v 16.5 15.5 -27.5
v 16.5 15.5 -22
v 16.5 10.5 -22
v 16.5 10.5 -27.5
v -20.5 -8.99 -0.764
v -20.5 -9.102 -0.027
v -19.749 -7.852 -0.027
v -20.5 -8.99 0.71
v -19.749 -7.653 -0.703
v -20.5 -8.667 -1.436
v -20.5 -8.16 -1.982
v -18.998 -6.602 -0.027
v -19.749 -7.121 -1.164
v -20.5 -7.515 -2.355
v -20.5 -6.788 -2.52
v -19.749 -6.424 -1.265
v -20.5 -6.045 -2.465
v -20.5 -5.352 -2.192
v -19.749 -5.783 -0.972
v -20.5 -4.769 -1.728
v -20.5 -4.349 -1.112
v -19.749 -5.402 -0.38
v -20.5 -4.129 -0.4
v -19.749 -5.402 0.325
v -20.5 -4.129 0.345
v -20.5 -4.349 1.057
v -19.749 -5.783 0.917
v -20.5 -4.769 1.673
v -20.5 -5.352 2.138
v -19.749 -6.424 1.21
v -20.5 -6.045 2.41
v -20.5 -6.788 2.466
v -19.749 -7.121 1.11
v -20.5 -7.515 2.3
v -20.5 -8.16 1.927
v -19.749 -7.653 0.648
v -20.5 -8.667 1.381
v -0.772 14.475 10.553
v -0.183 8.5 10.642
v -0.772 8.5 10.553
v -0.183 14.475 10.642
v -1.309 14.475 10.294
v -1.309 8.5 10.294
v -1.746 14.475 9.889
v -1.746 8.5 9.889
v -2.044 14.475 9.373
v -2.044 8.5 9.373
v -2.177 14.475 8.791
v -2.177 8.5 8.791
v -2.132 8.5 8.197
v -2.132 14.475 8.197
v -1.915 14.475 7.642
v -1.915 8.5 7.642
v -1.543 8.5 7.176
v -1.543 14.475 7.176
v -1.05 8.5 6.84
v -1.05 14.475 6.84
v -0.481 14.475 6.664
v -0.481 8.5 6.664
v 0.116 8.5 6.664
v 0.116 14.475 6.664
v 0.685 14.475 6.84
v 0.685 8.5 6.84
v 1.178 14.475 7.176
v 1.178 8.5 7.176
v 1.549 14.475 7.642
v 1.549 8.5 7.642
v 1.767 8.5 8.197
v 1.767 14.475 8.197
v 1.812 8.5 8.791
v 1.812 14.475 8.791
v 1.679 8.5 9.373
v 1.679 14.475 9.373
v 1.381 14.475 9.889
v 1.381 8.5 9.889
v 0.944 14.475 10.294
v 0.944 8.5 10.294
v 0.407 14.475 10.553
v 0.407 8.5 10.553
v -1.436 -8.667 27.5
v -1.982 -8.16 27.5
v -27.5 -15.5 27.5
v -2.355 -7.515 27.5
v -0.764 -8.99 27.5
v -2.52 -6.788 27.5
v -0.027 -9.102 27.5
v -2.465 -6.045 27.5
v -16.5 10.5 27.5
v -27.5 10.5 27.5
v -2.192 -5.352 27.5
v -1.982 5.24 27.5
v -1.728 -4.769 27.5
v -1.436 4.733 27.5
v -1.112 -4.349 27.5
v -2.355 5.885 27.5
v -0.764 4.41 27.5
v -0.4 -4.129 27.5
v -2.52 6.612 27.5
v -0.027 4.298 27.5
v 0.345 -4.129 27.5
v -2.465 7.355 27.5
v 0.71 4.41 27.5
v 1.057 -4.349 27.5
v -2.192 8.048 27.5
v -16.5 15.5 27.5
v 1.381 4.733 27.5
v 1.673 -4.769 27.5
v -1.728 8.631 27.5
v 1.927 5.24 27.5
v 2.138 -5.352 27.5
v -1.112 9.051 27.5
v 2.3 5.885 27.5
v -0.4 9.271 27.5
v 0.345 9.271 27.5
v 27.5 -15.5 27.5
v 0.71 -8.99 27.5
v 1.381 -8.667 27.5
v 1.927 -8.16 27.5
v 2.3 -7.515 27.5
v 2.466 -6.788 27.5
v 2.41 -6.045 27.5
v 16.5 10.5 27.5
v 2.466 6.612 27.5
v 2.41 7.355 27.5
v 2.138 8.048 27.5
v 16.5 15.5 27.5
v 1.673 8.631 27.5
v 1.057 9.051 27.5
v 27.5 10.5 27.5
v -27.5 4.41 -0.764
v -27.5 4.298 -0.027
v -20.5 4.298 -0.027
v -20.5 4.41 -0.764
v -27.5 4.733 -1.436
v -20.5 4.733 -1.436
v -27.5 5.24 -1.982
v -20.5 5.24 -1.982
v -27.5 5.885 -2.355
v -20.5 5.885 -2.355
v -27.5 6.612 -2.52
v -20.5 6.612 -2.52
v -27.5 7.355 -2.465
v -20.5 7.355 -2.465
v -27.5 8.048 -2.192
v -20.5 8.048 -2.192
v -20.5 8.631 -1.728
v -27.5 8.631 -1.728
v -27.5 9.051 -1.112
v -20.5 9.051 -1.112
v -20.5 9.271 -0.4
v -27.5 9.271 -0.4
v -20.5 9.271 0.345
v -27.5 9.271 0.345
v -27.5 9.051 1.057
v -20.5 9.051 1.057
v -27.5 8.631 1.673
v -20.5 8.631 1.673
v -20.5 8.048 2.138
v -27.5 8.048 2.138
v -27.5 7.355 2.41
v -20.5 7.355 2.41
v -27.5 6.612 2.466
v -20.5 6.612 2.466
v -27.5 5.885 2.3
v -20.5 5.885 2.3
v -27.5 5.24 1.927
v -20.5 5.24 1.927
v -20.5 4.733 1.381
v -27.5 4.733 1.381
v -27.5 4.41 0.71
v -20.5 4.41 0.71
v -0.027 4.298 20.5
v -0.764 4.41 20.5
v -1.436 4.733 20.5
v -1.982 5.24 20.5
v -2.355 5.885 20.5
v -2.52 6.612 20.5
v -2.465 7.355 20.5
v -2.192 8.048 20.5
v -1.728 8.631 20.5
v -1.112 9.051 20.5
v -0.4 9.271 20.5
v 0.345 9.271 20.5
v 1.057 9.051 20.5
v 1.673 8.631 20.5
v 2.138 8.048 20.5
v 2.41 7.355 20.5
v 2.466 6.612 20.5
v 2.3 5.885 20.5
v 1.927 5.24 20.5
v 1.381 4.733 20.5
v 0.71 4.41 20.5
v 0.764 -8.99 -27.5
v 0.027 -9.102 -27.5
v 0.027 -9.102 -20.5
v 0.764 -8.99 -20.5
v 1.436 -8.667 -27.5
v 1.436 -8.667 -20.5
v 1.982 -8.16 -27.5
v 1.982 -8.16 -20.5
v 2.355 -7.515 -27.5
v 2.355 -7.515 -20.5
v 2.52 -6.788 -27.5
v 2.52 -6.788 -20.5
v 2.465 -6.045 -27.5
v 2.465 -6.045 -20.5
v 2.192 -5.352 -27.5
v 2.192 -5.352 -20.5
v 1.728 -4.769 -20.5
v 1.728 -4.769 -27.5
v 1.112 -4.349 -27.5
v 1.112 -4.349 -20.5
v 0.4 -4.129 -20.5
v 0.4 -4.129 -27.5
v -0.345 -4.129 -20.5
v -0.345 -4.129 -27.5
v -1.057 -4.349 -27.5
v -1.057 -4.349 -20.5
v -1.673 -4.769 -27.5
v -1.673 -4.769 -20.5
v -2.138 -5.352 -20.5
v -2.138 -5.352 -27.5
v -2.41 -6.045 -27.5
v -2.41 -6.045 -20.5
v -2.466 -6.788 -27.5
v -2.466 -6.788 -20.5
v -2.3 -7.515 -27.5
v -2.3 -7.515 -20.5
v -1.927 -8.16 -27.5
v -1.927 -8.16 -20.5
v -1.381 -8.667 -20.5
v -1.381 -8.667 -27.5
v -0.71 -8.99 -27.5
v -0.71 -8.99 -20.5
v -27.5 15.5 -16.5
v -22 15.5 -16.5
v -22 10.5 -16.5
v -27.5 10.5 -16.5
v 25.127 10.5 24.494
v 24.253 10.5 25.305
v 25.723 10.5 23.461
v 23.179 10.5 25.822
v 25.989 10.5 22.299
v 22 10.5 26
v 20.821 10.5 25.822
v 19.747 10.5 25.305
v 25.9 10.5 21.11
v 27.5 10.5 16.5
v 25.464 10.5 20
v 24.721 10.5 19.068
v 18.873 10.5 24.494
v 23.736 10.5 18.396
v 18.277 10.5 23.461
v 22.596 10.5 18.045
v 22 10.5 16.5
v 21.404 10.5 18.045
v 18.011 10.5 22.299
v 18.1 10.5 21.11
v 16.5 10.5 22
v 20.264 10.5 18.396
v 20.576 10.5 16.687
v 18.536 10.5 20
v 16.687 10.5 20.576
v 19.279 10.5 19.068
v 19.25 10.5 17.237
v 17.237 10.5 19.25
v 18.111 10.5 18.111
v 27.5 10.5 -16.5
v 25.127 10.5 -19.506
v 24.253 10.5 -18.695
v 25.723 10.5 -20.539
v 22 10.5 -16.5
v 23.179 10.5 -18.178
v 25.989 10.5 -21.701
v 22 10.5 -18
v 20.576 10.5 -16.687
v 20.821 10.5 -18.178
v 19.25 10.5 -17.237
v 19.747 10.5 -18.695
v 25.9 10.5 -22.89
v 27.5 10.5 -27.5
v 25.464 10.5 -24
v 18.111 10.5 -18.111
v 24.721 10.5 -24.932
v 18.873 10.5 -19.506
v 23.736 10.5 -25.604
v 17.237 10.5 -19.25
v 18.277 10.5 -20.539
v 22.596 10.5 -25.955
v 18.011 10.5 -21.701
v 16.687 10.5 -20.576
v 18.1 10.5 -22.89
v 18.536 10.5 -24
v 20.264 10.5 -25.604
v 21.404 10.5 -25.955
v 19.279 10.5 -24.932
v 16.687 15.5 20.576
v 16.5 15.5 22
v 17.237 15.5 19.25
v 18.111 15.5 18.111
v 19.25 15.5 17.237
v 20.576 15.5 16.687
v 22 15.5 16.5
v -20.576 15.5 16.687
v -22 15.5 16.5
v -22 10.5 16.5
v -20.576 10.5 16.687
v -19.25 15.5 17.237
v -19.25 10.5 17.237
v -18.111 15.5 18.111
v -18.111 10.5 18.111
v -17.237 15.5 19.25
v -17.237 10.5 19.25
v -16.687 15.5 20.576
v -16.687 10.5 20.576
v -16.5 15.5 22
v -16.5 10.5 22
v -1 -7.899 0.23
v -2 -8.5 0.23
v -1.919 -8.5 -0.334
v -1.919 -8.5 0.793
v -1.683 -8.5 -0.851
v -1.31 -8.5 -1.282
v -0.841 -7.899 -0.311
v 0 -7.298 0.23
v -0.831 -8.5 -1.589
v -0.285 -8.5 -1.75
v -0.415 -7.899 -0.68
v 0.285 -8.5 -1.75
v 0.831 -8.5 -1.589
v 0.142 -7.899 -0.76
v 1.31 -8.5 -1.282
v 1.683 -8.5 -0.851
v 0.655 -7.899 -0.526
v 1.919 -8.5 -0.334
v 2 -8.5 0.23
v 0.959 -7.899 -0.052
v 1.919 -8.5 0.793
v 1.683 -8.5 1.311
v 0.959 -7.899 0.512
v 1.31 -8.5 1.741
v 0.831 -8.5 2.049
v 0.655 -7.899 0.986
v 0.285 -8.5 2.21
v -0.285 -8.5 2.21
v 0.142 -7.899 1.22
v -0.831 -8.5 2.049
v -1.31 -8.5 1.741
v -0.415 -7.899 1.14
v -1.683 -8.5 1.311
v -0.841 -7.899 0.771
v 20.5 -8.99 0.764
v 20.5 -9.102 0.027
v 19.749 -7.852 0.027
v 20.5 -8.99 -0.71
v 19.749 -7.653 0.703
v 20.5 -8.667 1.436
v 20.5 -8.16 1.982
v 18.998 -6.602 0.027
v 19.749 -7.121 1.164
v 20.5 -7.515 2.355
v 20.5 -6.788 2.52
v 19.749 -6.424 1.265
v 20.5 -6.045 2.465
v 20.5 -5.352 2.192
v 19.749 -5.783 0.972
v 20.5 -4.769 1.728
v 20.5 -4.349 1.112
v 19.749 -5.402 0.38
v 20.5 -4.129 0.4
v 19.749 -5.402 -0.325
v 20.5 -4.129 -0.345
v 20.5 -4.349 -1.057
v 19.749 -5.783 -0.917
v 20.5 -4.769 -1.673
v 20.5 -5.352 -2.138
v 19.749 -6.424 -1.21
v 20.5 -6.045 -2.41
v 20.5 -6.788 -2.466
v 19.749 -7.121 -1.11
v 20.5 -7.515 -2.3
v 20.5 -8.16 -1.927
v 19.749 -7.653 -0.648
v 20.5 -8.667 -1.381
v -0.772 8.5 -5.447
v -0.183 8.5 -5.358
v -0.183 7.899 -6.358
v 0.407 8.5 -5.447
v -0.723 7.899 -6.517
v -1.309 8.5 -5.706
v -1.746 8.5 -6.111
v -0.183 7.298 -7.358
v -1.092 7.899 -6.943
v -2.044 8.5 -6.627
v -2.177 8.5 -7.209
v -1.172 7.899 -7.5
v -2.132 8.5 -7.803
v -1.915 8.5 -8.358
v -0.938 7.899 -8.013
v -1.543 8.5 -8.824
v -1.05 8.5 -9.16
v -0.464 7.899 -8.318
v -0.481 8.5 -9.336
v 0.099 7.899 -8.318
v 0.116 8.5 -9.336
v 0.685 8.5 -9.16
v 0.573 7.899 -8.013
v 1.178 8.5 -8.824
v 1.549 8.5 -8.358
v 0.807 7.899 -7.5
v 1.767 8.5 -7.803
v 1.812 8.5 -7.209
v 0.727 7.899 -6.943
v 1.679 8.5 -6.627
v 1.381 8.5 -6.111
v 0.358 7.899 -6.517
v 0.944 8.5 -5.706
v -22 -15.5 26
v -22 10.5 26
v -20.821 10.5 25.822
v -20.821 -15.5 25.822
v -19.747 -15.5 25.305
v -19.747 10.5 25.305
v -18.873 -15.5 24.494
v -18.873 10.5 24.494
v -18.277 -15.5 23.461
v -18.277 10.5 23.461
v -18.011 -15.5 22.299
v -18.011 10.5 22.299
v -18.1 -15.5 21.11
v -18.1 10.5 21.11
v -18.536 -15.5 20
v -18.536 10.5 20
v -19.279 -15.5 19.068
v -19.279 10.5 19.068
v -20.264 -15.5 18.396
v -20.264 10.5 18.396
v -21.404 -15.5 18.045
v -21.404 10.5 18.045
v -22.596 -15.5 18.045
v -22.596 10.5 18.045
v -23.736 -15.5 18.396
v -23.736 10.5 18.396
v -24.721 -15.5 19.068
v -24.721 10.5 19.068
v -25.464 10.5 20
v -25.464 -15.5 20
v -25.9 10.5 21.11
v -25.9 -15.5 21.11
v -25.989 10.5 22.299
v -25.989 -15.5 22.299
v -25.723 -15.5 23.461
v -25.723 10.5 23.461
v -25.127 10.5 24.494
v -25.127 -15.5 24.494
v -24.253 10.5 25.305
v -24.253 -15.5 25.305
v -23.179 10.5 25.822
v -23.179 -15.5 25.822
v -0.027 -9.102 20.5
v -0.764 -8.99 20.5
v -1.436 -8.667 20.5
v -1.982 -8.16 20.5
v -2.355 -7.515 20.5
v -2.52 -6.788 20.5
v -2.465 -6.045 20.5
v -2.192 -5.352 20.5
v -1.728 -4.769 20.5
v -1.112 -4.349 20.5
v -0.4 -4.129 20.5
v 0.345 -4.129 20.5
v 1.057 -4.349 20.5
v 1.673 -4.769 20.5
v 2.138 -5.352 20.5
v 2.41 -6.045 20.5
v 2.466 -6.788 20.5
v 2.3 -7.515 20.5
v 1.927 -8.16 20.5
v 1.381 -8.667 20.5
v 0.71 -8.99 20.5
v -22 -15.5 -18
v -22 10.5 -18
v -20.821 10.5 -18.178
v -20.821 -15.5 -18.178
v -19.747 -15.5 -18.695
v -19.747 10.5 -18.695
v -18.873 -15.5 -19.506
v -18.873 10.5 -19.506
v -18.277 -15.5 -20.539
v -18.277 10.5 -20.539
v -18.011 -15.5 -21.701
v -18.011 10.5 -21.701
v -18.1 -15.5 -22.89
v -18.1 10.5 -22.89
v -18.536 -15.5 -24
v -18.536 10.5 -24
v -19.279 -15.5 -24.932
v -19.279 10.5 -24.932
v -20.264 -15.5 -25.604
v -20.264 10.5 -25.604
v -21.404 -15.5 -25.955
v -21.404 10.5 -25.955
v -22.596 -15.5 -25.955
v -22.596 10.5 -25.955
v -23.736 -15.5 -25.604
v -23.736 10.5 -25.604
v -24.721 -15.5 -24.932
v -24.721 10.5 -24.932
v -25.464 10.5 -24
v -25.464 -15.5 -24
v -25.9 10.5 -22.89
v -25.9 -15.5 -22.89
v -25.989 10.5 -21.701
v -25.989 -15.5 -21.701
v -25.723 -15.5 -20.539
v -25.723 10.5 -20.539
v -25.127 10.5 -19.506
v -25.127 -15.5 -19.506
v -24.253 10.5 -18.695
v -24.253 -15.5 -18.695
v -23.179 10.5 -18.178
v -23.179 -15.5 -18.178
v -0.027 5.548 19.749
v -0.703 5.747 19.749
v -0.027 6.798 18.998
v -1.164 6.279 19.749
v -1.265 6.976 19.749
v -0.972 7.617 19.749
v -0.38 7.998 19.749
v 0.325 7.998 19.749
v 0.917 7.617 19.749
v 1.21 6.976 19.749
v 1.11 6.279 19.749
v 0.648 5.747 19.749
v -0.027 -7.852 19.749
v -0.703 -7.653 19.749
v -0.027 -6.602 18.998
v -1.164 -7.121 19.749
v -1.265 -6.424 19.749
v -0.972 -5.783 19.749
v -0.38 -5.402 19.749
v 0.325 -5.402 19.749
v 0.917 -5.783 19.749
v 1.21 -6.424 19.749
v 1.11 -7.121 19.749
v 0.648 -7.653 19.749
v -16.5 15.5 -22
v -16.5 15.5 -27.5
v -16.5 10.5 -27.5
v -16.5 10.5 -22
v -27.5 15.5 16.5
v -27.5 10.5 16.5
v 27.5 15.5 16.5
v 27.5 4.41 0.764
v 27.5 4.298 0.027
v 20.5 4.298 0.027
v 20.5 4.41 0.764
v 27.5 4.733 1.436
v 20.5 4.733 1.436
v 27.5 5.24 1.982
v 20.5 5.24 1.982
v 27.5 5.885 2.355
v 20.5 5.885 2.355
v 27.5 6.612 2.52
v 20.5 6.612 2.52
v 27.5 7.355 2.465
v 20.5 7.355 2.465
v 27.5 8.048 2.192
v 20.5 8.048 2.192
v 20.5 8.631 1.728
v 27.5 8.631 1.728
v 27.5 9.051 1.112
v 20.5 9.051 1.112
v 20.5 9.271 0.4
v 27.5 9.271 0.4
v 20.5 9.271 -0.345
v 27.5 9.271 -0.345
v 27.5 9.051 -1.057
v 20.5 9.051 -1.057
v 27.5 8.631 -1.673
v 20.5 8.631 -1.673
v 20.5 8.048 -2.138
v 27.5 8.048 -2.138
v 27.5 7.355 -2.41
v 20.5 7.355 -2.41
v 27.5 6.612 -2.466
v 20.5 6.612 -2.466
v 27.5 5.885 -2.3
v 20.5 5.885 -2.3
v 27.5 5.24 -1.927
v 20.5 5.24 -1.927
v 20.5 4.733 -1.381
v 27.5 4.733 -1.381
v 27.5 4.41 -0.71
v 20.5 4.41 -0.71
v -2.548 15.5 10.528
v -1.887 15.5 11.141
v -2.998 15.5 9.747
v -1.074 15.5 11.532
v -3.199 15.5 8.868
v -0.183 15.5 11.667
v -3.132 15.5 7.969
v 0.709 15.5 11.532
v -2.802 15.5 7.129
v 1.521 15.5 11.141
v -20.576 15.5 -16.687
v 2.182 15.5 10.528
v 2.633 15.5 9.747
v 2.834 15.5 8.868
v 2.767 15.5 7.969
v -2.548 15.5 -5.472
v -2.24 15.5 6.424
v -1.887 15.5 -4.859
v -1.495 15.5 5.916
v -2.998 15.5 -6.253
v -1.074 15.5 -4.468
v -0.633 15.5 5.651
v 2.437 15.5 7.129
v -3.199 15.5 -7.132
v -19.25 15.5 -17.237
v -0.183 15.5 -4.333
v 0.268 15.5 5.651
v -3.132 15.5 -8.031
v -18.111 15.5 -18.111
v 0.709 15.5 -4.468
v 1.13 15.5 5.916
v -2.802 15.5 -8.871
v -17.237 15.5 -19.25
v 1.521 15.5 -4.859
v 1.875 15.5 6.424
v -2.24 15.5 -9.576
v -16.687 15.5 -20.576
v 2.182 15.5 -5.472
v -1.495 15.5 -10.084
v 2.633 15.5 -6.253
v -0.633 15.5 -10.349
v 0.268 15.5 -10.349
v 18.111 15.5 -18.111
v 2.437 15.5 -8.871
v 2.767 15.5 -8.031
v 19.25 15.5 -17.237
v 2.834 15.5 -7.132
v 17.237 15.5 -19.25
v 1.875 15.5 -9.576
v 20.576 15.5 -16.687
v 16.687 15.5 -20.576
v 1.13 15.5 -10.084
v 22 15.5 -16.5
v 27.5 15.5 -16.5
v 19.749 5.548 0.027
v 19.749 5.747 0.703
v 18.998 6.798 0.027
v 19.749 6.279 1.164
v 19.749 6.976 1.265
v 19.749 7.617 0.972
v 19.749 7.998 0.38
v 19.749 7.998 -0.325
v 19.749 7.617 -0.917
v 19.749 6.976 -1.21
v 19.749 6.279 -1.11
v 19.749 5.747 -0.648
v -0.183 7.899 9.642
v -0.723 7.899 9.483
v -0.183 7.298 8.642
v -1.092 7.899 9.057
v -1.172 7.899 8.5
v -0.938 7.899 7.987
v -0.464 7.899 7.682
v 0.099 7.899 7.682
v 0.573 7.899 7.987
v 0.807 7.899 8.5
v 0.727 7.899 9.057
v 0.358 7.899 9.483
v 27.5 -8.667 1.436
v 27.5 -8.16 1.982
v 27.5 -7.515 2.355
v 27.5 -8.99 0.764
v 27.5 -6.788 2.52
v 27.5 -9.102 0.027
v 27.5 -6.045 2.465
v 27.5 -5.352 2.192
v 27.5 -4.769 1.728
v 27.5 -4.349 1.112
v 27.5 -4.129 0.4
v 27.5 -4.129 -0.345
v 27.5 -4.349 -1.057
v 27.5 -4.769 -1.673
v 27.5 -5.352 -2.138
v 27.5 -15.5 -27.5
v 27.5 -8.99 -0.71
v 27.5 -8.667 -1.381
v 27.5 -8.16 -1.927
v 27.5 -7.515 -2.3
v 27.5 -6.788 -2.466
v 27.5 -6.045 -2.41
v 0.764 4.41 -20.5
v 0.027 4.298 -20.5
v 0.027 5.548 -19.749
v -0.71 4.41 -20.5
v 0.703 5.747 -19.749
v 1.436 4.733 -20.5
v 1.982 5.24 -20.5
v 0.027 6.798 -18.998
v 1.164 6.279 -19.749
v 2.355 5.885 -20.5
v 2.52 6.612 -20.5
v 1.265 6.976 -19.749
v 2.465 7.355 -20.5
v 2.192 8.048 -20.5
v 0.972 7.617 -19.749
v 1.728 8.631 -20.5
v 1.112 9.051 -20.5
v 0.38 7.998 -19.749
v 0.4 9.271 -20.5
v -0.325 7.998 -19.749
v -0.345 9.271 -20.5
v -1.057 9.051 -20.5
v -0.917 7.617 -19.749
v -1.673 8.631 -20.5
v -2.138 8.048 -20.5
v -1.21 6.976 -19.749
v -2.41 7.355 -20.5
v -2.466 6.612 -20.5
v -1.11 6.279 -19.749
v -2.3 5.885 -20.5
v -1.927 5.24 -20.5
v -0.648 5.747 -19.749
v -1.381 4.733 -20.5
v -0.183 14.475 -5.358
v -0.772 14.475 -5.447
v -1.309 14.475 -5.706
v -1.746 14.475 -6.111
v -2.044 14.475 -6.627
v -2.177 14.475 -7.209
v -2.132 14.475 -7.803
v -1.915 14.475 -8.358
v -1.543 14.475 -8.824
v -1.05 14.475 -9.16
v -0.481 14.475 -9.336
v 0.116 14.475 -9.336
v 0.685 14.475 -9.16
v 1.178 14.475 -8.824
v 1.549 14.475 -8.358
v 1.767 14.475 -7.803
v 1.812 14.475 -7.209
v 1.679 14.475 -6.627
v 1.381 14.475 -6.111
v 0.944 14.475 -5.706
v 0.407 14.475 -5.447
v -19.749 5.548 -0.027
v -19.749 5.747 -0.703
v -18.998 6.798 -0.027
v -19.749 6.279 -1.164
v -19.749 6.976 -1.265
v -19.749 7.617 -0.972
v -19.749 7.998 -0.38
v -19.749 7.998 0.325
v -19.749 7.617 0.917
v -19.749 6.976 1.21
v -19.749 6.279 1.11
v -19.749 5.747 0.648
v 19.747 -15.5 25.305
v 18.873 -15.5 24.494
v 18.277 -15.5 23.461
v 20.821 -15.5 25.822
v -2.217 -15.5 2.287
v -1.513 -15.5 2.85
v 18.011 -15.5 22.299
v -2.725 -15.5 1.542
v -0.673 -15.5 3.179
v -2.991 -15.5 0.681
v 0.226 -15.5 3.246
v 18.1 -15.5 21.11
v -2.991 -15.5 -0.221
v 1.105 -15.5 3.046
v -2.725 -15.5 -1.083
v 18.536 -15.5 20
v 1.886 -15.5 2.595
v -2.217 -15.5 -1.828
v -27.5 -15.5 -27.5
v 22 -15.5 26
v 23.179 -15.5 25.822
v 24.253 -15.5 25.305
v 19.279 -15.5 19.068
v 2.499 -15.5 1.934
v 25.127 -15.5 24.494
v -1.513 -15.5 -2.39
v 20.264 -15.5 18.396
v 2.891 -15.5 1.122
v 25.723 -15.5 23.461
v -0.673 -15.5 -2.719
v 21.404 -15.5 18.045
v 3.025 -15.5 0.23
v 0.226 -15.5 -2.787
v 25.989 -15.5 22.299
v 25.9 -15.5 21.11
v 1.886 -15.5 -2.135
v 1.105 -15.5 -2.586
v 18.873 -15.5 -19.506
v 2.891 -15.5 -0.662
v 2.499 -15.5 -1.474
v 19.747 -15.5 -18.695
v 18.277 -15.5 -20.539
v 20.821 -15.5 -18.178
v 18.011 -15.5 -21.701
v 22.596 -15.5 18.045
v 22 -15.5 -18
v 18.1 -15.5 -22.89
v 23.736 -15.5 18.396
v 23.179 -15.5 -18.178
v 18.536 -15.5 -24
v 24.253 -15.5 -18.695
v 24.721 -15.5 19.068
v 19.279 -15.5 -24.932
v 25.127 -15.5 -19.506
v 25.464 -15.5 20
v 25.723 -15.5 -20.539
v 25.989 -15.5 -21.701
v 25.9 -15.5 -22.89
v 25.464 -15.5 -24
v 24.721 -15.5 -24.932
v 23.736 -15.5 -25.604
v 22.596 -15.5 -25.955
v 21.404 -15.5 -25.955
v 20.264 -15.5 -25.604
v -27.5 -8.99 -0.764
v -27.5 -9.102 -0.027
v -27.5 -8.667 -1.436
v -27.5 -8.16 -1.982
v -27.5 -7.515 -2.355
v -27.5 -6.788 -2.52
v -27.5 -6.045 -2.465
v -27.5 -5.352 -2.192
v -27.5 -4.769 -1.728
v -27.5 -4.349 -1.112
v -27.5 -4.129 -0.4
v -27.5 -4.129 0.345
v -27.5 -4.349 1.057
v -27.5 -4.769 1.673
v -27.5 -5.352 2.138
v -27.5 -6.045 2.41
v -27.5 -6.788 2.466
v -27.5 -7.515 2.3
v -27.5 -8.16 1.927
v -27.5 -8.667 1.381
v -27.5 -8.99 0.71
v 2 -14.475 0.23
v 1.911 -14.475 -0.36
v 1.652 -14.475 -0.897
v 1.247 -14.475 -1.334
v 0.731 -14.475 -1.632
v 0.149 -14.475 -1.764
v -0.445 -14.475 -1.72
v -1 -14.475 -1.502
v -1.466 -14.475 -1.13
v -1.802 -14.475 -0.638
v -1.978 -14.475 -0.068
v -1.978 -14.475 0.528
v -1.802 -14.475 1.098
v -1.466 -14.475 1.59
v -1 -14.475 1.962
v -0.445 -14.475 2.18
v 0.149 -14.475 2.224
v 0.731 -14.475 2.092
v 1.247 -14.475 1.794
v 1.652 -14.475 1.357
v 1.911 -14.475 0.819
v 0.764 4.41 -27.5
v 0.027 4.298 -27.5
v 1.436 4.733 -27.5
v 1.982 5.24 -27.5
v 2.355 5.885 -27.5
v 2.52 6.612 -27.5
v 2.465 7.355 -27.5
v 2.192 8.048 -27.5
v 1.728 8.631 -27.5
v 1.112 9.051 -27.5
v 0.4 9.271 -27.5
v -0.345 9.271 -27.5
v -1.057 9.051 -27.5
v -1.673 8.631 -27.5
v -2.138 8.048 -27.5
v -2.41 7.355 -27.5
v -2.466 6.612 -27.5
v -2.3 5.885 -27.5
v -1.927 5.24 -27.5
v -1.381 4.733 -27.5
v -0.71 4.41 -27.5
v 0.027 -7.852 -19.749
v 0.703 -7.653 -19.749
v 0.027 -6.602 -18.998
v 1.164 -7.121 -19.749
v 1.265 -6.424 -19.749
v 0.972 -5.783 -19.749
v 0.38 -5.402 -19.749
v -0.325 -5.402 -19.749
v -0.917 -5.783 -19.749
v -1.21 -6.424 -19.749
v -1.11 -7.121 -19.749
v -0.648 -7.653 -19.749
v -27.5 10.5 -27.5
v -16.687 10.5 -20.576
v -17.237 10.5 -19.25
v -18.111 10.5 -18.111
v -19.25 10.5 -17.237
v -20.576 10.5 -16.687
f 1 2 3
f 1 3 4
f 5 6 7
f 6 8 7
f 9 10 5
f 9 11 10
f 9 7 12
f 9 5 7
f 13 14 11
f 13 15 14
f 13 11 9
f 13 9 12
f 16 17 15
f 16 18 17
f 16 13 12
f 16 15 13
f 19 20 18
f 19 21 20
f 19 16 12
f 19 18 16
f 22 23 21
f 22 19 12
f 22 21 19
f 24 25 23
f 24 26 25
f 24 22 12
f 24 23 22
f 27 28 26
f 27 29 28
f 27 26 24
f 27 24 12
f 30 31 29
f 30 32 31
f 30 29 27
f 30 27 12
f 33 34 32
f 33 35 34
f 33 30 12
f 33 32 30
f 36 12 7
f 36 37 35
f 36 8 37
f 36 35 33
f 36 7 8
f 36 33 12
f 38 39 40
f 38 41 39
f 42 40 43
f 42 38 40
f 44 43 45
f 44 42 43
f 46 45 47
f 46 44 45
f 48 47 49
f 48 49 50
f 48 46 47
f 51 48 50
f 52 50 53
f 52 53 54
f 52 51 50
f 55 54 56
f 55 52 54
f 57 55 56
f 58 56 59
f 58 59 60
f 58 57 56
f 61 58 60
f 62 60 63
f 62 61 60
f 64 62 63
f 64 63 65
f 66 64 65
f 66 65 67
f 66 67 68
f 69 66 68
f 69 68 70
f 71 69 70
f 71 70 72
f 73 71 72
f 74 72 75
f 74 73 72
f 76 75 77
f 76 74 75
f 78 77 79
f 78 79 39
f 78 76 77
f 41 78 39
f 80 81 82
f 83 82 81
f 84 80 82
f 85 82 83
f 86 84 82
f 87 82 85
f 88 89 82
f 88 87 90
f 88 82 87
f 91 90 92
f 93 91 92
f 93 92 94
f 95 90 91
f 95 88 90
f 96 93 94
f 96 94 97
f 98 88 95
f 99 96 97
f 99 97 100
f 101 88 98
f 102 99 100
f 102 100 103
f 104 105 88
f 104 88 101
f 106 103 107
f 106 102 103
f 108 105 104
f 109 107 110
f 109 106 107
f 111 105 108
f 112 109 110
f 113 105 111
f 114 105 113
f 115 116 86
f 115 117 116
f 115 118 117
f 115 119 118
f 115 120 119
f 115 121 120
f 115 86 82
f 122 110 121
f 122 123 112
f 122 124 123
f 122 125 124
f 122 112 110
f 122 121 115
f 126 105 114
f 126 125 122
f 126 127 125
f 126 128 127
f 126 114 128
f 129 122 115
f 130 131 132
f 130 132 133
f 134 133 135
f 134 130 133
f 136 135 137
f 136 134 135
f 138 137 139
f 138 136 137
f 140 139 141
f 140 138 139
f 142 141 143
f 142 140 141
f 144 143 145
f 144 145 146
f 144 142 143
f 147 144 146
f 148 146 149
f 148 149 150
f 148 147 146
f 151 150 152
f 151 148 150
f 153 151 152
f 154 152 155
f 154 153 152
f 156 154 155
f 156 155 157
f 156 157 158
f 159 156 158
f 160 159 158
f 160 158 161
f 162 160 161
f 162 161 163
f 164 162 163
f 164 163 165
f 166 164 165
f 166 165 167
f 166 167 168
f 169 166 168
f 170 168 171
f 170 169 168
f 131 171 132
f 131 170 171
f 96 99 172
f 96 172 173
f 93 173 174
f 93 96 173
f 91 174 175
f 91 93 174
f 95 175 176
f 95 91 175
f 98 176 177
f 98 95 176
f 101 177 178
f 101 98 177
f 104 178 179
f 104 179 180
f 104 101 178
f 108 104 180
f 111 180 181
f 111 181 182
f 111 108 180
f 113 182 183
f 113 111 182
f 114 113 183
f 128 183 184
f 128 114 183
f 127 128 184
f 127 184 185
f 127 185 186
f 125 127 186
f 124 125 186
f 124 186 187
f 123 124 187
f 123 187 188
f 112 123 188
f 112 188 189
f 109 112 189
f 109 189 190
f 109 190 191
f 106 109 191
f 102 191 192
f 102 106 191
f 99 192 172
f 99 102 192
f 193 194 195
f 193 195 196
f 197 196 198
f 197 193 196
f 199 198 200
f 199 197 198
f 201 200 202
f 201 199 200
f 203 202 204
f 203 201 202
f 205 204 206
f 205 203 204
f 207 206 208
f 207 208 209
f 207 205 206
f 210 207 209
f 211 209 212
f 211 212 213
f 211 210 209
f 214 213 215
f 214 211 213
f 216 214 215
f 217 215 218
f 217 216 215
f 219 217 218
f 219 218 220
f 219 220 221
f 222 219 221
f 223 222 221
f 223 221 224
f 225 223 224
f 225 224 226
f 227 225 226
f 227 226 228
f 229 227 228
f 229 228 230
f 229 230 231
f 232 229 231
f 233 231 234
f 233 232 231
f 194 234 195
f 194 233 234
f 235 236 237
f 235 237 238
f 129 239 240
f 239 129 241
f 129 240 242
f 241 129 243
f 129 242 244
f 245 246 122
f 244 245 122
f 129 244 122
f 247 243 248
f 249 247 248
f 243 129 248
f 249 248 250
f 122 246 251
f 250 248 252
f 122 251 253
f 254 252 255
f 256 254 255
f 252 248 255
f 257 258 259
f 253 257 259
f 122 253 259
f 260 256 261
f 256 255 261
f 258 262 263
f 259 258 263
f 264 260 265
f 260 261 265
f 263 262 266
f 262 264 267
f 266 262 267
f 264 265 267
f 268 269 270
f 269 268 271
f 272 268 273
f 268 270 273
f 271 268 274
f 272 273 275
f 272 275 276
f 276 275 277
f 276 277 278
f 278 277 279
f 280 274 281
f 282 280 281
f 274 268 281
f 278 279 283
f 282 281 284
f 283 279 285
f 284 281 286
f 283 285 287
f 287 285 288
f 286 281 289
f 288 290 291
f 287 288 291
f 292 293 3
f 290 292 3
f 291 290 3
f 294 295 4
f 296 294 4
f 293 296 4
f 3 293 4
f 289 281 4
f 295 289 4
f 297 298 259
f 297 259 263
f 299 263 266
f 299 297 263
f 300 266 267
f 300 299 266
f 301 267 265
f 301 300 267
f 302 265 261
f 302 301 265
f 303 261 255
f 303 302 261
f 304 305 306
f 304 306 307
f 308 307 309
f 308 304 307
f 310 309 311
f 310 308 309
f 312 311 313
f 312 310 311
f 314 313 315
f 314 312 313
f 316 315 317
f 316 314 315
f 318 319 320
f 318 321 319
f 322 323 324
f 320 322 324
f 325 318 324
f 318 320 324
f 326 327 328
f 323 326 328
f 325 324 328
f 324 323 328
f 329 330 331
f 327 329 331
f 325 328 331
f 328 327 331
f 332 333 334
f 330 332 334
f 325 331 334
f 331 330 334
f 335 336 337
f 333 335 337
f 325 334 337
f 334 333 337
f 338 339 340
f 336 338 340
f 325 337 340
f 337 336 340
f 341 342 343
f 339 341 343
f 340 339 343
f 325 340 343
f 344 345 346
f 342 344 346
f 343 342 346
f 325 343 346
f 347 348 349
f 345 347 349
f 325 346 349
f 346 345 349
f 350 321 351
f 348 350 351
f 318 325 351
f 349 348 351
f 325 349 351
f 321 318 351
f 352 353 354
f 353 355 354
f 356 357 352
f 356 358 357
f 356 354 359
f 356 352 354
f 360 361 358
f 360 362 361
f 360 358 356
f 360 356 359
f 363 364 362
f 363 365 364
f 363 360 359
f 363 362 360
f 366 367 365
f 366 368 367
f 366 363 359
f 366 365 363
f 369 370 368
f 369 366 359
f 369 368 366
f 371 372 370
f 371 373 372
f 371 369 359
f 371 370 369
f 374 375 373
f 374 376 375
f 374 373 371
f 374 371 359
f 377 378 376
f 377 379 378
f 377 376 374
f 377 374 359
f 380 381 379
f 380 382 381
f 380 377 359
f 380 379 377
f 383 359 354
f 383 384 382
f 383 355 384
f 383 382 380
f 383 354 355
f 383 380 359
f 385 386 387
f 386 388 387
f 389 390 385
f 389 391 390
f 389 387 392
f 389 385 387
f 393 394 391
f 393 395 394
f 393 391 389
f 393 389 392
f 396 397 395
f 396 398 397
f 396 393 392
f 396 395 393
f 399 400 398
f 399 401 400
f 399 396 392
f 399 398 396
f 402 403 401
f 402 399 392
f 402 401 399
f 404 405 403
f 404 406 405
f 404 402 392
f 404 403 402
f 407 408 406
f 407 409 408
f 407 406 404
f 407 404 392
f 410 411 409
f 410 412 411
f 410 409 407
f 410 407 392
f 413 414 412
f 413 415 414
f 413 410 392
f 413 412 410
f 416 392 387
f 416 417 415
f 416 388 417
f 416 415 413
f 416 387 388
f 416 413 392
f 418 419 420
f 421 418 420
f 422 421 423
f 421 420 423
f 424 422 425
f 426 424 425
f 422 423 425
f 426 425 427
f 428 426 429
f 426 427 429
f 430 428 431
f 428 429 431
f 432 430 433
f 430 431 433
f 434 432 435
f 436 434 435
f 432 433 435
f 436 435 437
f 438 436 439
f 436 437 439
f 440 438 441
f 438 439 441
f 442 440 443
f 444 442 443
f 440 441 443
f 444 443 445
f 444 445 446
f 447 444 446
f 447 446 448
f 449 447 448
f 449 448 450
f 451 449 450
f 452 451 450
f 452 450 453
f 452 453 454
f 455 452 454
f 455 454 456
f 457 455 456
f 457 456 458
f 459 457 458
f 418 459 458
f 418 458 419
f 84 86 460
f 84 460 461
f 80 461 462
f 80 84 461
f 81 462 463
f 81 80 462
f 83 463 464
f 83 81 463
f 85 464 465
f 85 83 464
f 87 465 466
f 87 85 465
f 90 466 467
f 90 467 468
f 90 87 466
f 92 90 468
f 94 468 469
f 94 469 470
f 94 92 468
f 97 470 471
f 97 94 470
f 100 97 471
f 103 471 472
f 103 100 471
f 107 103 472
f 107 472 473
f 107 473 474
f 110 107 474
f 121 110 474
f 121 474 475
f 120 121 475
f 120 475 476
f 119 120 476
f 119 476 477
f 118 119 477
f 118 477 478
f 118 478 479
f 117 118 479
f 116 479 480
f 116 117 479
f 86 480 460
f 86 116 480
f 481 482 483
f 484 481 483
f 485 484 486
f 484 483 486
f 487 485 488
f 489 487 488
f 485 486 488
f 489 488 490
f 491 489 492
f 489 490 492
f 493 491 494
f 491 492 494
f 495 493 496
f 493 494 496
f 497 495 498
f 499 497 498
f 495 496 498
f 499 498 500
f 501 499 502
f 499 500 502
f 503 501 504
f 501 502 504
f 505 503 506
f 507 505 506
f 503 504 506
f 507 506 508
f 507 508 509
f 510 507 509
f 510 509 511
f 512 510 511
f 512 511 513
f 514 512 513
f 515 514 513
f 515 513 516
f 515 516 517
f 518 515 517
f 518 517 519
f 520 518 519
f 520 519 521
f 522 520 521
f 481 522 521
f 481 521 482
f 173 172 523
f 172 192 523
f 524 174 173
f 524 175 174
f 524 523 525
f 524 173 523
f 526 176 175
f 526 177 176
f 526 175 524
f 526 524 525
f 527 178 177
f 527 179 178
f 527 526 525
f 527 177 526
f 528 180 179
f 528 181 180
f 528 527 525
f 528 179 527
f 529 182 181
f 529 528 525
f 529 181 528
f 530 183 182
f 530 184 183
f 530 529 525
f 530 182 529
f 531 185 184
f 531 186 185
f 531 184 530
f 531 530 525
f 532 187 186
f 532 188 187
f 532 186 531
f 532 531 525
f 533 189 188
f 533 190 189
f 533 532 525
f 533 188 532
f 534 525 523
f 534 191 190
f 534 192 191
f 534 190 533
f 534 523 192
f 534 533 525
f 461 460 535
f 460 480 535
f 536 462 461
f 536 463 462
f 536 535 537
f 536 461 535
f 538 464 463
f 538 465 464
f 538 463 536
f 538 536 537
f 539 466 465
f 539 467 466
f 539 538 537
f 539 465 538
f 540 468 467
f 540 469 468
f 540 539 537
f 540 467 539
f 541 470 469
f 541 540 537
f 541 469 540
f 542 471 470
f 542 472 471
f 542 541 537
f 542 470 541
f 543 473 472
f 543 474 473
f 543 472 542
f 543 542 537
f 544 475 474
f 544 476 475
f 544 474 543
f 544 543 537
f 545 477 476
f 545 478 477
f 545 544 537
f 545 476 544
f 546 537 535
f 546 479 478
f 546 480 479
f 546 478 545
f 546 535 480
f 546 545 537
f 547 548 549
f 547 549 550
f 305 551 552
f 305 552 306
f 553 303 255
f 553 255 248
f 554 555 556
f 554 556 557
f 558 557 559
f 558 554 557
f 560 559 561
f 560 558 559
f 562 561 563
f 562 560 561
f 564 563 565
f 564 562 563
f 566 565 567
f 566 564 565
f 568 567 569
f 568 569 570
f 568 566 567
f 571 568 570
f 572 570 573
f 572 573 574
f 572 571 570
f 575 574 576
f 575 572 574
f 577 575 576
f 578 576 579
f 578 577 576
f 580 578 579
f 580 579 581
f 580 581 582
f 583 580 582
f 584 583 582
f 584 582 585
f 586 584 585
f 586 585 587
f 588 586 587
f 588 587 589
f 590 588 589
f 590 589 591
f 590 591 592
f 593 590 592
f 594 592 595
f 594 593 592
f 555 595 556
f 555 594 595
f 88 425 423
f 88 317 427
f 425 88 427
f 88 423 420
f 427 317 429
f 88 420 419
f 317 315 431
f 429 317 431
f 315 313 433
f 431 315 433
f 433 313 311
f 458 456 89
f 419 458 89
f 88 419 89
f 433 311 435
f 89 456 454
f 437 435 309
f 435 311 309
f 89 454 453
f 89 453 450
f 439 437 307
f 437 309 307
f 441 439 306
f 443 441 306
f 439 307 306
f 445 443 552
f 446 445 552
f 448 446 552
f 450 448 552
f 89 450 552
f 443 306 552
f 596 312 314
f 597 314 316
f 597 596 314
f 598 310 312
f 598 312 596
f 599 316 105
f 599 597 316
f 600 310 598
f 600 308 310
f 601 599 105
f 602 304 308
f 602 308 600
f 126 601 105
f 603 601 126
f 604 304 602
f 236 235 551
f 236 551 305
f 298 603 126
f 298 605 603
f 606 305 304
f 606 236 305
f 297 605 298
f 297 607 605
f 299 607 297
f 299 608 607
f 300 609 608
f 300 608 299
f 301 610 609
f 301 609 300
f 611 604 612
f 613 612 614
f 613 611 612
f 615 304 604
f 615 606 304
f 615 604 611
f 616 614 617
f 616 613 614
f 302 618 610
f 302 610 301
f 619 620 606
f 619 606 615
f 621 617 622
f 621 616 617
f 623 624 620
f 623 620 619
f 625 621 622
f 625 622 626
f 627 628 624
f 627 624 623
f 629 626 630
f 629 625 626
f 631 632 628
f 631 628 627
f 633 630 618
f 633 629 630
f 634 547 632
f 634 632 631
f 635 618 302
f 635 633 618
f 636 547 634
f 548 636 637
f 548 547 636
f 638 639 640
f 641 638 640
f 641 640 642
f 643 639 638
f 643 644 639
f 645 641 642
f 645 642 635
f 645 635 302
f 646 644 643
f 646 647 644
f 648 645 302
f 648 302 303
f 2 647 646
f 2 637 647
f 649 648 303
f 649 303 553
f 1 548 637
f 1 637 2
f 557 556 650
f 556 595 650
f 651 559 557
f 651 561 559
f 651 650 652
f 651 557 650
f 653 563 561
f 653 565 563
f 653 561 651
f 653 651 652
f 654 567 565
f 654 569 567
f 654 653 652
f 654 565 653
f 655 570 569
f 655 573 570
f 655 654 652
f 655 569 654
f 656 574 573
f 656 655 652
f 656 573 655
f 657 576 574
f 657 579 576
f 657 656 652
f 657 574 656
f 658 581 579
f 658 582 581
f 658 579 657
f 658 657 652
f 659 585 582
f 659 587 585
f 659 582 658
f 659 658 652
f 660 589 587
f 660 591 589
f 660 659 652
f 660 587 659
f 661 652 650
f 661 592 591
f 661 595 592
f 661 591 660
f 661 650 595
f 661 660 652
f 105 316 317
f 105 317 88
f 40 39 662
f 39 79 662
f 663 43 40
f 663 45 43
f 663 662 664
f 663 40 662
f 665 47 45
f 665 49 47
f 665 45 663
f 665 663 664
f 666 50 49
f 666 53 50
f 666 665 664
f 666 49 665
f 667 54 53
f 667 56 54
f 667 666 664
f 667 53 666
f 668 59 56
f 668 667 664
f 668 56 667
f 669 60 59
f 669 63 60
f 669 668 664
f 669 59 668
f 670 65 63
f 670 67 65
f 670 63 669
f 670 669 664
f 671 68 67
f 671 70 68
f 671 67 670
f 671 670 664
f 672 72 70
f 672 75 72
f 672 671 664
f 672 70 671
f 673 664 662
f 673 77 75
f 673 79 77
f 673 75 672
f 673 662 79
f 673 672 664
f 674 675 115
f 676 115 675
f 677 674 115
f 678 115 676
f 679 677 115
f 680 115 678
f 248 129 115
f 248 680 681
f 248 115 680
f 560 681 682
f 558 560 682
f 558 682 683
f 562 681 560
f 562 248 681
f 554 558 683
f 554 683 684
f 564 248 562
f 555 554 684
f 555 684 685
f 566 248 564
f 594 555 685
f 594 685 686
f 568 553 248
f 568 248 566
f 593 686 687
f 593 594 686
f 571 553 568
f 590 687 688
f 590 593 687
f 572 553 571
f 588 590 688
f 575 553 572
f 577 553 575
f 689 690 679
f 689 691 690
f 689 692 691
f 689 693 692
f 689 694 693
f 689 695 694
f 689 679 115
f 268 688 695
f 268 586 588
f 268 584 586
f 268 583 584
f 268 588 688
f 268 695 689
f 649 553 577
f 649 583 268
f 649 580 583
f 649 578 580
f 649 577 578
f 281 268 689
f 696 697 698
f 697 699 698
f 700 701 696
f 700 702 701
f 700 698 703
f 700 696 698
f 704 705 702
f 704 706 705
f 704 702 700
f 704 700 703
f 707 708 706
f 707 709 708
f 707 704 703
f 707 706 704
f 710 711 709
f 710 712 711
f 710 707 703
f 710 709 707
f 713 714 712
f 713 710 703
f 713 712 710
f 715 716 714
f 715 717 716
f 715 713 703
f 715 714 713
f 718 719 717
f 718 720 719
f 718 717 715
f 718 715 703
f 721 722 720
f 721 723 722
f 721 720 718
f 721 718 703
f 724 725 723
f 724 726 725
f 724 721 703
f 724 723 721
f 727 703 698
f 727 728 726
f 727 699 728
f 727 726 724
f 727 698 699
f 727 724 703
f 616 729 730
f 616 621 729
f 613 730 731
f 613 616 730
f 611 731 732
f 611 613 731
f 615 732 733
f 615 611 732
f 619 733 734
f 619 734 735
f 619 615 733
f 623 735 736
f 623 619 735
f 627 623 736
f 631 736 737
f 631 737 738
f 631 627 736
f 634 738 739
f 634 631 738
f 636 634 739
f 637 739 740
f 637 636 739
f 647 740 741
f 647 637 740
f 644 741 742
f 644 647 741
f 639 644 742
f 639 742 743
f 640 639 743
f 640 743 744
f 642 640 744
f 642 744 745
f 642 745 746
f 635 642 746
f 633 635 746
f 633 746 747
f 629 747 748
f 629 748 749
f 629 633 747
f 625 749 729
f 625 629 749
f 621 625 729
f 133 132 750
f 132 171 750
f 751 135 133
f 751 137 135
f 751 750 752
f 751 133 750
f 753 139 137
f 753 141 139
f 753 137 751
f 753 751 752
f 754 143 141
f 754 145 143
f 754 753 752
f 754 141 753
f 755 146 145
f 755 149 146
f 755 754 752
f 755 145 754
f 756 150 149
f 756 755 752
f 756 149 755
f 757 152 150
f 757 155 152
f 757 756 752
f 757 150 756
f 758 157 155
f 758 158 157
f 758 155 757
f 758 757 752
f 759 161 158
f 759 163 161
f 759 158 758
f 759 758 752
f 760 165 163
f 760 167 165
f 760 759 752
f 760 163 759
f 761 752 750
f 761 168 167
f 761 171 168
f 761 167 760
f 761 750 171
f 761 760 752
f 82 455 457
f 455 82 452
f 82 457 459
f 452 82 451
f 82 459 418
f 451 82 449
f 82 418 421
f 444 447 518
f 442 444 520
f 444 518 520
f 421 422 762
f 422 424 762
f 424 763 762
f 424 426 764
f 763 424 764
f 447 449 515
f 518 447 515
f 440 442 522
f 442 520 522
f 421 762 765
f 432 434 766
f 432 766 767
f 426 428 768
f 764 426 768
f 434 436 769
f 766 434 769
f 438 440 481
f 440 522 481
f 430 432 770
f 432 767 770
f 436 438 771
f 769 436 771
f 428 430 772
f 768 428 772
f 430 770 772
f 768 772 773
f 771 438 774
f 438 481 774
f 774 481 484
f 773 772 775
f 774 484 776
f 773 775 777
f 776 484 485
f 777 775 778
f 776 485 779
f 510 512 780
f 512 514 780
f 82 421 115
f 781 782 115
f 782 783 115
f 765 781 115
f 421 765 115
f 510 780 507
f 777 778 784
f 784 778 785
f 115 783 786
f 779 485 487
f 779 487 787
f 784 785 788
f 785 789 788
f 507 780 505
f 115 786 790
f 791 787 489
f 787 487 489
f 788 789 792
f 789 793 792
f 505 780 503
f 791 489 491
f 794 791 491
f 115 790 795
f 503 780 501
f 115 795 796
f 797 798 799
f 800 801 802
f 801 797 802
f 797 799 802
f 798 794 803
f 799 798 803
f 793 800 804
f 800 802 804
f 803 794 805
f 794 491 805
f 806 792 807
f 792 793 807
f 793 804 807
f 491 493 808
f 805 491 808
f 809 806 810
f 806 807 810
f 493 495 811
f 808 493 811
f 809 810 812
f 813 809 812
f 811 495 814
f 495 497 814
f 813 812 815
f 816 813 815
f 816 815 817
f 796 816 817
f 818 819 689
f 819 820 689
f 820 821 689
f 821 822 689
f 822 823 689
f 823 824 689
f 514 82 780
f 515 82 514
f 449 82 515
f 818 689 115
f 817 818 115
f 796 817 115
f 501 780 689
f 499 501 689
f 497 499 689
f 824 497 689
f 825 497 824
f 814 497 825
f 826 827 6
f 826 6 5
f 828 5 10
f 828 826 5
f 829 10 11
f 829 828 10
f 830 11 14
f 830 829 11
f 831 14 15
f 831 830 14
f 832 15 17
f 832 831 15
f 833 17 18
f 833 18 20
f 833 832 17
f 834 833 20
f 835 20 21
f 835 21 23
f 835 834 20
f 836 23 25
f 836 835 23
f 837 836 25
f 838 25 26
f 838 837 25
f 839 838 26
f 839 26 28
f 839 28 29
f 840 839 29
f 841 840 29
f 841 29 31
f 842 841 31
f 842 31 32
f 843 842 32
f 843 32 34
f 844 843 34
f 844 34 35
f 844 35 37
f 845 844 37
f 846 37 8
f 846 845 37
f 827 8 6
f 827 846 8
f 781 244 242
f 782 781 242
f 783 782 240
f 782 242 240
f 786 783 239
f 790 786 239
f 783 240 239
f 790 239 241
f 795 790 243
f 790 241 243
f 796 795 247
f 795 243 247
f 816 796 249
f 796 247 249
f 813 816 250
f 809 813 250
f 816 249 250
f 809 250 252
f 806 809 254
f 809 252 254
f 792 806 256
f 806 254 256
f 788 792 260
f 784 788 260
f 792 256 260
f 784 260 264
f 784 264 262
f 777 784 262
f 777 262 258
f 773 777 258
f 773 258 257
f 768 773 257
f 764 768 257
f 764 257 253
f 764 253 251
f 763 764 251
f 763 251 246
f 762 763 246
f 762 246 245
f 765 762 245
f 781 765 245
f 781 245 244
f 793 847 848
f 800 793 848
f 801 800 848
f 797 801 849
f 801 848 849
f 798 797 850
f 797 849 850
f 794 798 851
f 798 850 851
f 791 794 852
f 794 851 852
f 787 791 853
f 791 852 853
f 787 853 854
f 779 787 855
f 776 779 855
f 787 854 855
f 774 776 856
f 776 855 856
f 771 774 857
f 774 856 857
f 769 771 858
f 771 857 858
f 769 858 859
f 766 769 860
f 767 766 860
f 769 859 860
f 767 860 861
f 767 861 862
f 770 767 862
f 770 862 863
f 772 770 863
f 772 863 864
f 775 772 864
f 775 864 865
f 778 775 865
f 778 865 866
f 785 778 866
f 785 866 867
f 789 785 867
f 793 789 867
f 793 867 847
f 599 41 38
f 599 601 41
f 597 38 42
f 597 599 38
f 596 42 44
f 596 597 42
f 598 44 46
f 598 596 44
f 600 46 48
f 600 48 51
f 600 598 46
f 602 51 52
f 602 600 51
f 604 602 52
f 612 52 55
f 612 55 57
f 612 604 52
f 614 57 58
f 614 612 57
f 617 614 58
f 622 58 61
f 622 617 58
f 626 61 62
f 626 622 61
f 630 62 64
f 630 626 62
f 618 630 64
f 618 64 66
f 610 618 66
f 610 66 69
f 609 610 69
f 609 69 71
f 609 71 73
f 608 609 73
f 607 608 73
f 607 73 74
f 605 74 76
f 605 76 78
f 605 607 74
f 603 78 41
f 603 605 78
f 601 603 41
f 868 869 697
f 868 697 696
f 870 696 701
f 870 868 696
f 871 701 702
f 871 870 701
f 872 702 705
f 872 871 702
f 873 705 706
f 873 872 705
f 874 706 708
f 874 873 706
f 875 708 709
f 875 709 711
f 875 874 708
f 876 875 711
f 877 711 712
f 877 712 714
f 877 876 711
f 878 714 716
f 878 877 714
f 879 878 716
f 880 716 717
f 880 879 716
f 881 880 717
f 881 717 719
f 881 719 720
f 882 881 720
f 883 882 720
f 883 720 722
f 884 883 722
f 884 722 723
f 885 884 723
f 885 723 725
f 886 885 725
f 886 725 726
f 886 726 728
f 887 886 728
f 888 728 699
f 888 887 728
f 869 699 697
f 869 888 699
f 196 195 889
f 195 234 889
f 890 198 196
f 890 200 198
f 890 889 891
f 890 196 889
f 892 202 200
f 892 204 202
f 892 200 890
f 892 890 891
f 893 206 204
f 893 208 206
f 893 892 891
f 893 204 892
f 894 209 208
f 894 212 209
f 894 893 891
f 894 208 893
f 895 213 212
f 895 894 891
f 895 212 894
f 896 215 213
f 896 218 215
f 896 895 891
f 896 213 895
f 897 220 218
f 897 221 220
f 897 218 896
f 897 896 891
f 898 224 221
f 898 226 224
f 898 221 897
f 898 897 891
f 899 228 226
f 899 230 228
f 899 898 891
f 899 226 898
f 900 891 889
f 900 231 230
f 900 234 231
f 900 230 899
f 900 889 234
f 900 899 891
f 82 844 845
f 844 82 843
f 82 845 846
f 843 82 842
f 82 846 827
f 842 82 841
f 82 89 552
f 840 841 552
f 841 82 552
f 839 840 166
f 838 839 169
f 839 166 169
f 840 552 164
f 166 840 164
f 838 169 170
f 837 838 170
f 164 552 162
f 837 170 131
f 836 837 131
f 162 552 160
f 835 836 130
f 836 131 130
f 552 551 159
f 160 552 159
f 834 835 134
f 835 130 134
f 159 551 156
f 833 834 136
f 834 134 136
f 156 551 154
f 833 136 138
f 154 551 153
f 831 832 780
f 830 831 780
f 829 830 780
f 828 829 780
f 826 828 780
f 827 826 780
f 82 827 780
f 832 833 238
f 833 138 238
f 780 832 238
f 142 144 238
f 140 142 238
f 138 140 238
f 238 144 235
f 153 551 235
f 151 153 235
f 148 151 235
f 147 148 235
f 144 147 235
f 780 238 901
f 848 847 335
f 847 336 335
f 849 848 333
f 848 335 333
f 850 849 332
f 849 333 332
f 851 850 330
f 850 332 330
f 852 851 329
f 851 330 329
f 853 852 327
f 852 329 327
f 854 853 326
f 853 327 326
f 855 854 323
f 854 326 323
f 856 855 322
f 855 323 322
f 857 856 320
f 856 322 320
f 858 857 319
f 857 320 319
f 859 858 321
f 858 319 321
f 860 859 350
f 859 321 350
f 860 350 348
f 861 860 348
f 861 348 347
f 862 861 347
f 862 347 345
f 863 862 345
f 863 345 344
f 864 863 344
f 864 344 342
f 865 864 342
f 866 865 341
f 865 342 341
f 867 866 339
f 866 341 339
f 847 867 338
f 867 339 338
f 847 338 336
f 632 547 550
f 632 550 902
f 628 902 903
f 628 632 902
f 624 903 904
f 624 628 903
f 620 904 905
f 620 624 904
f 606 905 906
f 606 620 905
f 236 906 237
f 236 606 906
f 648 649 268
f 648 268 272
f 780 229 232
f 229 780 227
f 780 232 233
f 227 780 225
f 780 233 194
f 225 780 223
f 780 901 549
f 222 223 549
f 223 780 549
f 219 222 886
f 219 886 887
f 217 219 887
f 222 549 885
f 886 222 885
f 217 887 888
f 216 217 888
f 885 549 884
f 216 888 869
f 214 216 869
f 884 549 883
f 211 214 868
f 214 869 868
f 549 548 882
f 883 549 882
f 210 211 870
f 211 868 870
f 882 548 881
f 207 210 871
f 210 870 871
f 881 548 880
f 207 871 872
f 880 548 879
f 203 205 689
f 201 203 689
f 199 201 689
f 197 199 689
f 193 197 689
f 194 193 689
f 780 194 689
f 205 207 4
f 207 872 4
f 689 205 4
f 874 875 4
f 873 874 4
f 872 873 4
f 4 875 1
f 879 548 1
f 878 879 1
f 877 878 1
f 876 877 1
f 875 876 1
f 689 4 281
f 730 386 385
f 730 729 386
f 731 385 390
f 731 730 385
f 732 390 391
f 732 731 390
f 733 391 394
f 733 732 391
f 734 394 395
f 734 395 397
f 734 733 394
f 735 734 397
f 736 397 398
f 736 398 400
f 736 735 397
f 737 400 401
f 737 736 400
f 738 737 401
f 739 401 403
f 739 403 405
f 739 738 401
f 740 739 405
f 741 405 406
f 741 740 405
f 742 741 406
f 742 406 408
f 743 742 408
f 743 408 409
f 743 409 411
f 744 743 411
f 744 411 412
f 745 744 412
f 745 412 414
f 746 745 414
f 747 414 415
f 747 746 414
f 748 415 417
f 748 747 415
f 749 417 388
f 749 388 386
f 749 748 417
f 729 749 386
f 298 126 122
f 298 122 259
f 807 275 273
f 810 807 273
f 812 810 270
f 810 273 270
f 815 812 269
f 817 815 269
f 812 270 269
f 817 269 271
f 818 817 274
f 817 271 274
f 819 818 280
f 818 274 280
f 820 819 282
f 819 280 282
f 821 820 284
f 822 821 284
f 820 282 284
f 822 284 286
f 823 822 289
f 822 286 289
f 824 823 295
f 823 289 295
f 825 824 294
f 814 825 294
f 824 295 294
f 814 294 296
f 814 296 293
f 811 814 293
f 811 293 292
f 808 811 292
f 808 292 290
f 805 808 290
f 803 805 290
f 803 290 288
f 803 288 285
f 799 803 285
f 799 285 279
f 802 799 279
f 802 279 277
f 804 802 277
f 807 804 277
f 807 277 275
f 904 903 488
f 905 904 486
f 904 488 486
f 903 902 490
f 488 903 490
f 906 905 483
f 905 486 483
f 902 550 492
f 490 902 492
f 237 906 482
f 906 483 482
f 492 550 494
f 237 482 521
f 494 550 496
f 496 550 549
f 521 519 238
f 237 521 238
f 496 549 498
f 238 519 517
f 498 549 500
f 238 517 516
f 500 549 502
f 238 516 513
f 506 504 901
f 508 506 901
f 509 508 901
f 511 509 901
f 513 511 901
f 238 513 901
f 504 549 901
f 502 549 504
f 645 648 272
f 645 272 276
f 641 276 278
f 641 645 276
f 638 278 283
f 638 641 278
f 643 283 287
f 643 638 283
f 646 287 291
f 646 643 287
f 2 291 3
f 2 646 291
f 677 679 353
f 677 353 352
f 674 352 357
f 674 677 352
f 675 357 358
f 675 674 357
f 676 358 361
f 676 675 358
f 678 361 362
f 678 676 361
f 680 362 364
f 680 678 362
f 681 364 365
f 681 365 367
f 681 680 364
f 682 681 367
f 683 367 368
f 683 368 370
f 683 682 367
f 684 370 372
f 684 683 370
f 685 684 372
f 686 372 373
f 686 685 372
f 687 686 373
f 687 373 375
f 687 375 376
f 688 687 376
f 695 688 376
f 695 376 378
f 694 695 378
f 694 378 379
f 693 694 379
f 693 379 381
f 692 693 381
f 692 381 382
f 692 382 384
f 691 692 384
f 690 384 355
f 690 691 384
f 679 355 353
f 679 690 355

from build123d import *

# Parameters (mm, degrees)
SKETCH_1_W                   = 55
SKETCH_1_H                   = 55
EXTRUDE_1_DEPTH              = 15.5
CUT_EXTRUDE_1_DEPTH          = 5
SKETCH_4_R                   = 4
CUT_EXTRUDE_2_DEPTH          = 47.781406563
PATTERN_LINEAR_3_COUNT       = 2
PATTERN_LINEAR_3_PITCH       = 16
PATTERN_LINEAR_4_COUNT       = 2
PATTERN_LINEAR_4_PITCH       = 13.4
PATTERN_CIRCULAR_2_COUNT     = 4
HOLE_WIZARD_M6_3_D           = 4
HOLE_WIZARD_M6_3_DEPTH       = 7
HOLE_WIZARD_M6_3_CSINK_D     = 6.05
HOLE_WIZARD_M6_3_CSINK_ANGLE = 90
HOLE_WIZARD_M6_3_TIP         = 1.201721238


with BuildPart() as part:
    # 草图1 → 凸台-拉伸1 (new, symmetric)
    with BuildSketch(Plane(origin=(0, 0, 0), x_dir=(1, 0, 0), z_dir=(0, 1, 0))):
        Rectangle(SKETCH_1_W, SKETCH_1_H)
    extrude(amount=EXTRUDE_1_DEPTH, both=True)

    # 草图2 → 切除-拉伸1 (cut)
    with BuildSketch(Plane(origin=(0, 15.5, 0), x_dir=(1, 0, 0), z_dir=(0, 1, 0))):
        with BuildLine():
            Line((16.5, 22), (16.5, 27.5))
            Line((16.5, 27.5), (27.5, 27.5))
            Line((27.5, 27.5), (27.5, 16.5))
            Line((27.5, 16.5), (21.999999502, 16.5))
            ThreePointArc((21.999999502, 16.5), (18.110912527, 18.11091288), (16.5, 22))
        make_face()
        with BuildLine():
            Line((22, -16.5), (27.5, -16.5))
            Line((27.5, -16.5), (27.5, -27.5))
            Line((27.5, -27.5), (16.5, -27.5))
            Line((16.5, -27.5), (16.5, -21.999999502))
            ThreePointArc((16.5, -21.999999502), (18.11091288, -18.110912527), (22, -16.5))
        make_face()
        with BuildLine():
            Line((-16.5, -22), (-16.5, -27.5))
            Line((-16.5, -27.5), (-27.5, -27.5))
            Line((-27.5, -27.5), (-27.5, -16.5))
            Line((-27.5, -16.5), (-21.999999502, -16.5))
            ThreePointArc((-21.999999502, -16.5), (-18.110912527, -18.11091288), (-16.5, -22))
        make_face()
        with BuildLine():
            Line((-22, 16.5), (-27.5, 16.5))
            Line((-27.5, 16.5), (-27.5, 27.5))
            Line((-27.5, 27.5), (-16.5, 27.5))
            Line((-16.5, 27.5), (-16.5, 21.999999502))
            ThreePointArc((-16.5, 21.999999502), (-18.11091288, 18.110912527), (-22, 16.5))
        make_face()
    extrude(amount=-CUT_EXTRUDE_1_DEPTH, mode=Mode.SUBTRACT)

    # 草图4 → 切除-拉伸2 (cut, through all)
    with BuildSketch(Plane(origin=(0, 10.5, 0), x_dir=(1, 0, 0), z_dir=(0, 1, 0))):
        with Locations(Location((22, 22, 0), (0, 0, 270))):
            Circle(SKETCH_4_R)
        with Locations(Location((22, -22, 0), (0, 0, 270))):
            Circle(SKETCH_4_R)
        with Locations(Location((-22, -22, 0), (0, 0, 270))):
            Circle(SKETCH_4_R)
        with Locations(Location((-22, 22, 0), (0, 0, 270))):
            Circle(SKETCH_4_R)
    extrude(amount=-CUT_EXTRUDE_2_DEPTH, mode=Mode.SUBTRACT)

    # 草图6 → M6 螺纹孔1 (revolve, cut)
    with BuildSketch(Plane(origin=(-0.027335572, -6.601540671, 27.5), x_dir=(0, -1, 0), z_dir=(1, 0, 0))):
        Polygon((0, 0), (0, 8.502151548), (2.5, 7), (2.5, -0.5), (2, 0), align=None)
    hole_wizard_m6_1 = revolve(axis=Axis((-0.027335572, -6.601540671, 33.85), (0, 0, -1)), mode=Mode.SUBTRACT)

    # 草图8 → M6 螺纹孔2 (revolve, cut)
    with BuildSketch(Plane(origin=(-0.182583925, 15.5, -7.358132173), x_dir=(0, 0, 1), z_dir=(1, 0, 0))):
        Polygon((0, 0), (0, 8.201721238), (2, 7), (2, 1.025), (3.025, 0), align=None)
    hole_wizard_m6_2 = revolve(axis=Axis((-0.182583925, 21.85, -7.358132173), (0, -1, 0)), mode=Mode.SUBTRACT)

    # 阵列(线性)3: M6 螺纹孔2 ×2
    with Locations(*[(0, 0, i * PATTERN_LINEAR_3_PITCH) for i in range(1, PATTERN_LINEAR_3_COUNT)]):
        add(hole_wizard_m6_2, mode=Mode.SUBTRACT)

    # 阵列(线性)4: M6 螺纹孔1 ×2
    with Locations(*[(0, i * PATTERN_LINEAR_4_PITCH, 0) for i in range(1, PATTERN_LINEAR_4_COUNT)]):
        add(hole_wizard_m6_1, mode=Mode.SUBTRACT)

    # 阵列(圆周)2: M6 螺纹孔1 ×4 about axis
    pattern_circular_2_axis = Axis((0, 0, 0), (0, 1, 0))
    for i in range(1, PATTERN_CIRCULAR_2_COUNT):
        add(hole_wizard_m6_1.rotate(pattern_circular_2_axis, i * 360 / PATTERN_CIRCULAR_2_COUNT), mode=Mode.SUBTRACT)

    # 阵列(圆周)2 copy 1 sketch → 阵列(圆周)2 copy 1 (revolve, cut)
    with BuildSketch(Plane(origin=(27.5, 6.798459329, 0.027335572), x_dir=(0, -1, 0), z_dir=(0, 0, -1))):
        Polygon((0, 0), (0, 8.502151548), (2.5, 7), (2.5, -0.5), (2, 0), align=None)
    revolve(axis=Axis((33.85, 6.798459329, 0.027335572), (-1, 0, 0)), mode=Mode.SUBTRACT)

    # 阵列(圆周)2 copy 2 sketch → 阵列(圆周)2 copy 2 (revolve, cut)
    with BuildSketch(Plane(origin=(0.027335572, 6.798459329, -27.5), x_dir=(0, -1, 0), z_dir=(-1, 0, 0))):
        Polygon((0, 0), (0, 8.502151548), (2.5, 7), (2.5, -0.5), (2, 0), align=None)
    revolve(axis=Axis((0.027335572, 6.798459329, -33.85), (0, 0, 1)), mode=Mode.SUBTRACT)

    # 阵列(圆周)2 copy 3 sketch → 阵列(圆周)2 copy 3 (revolve, cut)
    with BuildSketch(Plane(origin=(-27.5, 6.798459329, -0.027335572), x_dir=(0, -1, 0), z_dir=(0, 0, 1))):
        Polygon((0, 0), (0, 8.502151548), (2.5, 7), (2.5, -0.5), (2, 0), align=None)
    revolve(axis=Axis((-33.85, 6.798459329, -0.027335572), (1, 0, 0)), mode=Mode.SUBTRACT)

    # M6 螺纹孔3
    with Locations(Plane(origin=(-6.578522575, -15.5, 8.386748618), x_dir=(-1, 0, 0), z_dir=(0, -1, 0))):
        with Locations((-6.578522575, 8.156808217)):
            CounterSinkHole(HOLE_WIZARD_M6_3_D / 2, HOLE_WIZARD_M6_3_CSINK_D / 2, depth=HOLE_WIZARD_M6_3_DEPTH, counter_sink_angle=HOLE_WIZARD_M6_3_CSINK_ANGLE)
            with Locations((0, 0, -(HOLE_WIZARD_M6_3_DEPTH + HOLE_WIZARD_M6_3_TIP / 2))):  # 118° drill point
                Cone(0, HOLE_WIZARD_M6_3_D / 2, HOLE_WIZARD_M6_3_TIP, mode=Mode.SUBTRACT)


solid = part.part
